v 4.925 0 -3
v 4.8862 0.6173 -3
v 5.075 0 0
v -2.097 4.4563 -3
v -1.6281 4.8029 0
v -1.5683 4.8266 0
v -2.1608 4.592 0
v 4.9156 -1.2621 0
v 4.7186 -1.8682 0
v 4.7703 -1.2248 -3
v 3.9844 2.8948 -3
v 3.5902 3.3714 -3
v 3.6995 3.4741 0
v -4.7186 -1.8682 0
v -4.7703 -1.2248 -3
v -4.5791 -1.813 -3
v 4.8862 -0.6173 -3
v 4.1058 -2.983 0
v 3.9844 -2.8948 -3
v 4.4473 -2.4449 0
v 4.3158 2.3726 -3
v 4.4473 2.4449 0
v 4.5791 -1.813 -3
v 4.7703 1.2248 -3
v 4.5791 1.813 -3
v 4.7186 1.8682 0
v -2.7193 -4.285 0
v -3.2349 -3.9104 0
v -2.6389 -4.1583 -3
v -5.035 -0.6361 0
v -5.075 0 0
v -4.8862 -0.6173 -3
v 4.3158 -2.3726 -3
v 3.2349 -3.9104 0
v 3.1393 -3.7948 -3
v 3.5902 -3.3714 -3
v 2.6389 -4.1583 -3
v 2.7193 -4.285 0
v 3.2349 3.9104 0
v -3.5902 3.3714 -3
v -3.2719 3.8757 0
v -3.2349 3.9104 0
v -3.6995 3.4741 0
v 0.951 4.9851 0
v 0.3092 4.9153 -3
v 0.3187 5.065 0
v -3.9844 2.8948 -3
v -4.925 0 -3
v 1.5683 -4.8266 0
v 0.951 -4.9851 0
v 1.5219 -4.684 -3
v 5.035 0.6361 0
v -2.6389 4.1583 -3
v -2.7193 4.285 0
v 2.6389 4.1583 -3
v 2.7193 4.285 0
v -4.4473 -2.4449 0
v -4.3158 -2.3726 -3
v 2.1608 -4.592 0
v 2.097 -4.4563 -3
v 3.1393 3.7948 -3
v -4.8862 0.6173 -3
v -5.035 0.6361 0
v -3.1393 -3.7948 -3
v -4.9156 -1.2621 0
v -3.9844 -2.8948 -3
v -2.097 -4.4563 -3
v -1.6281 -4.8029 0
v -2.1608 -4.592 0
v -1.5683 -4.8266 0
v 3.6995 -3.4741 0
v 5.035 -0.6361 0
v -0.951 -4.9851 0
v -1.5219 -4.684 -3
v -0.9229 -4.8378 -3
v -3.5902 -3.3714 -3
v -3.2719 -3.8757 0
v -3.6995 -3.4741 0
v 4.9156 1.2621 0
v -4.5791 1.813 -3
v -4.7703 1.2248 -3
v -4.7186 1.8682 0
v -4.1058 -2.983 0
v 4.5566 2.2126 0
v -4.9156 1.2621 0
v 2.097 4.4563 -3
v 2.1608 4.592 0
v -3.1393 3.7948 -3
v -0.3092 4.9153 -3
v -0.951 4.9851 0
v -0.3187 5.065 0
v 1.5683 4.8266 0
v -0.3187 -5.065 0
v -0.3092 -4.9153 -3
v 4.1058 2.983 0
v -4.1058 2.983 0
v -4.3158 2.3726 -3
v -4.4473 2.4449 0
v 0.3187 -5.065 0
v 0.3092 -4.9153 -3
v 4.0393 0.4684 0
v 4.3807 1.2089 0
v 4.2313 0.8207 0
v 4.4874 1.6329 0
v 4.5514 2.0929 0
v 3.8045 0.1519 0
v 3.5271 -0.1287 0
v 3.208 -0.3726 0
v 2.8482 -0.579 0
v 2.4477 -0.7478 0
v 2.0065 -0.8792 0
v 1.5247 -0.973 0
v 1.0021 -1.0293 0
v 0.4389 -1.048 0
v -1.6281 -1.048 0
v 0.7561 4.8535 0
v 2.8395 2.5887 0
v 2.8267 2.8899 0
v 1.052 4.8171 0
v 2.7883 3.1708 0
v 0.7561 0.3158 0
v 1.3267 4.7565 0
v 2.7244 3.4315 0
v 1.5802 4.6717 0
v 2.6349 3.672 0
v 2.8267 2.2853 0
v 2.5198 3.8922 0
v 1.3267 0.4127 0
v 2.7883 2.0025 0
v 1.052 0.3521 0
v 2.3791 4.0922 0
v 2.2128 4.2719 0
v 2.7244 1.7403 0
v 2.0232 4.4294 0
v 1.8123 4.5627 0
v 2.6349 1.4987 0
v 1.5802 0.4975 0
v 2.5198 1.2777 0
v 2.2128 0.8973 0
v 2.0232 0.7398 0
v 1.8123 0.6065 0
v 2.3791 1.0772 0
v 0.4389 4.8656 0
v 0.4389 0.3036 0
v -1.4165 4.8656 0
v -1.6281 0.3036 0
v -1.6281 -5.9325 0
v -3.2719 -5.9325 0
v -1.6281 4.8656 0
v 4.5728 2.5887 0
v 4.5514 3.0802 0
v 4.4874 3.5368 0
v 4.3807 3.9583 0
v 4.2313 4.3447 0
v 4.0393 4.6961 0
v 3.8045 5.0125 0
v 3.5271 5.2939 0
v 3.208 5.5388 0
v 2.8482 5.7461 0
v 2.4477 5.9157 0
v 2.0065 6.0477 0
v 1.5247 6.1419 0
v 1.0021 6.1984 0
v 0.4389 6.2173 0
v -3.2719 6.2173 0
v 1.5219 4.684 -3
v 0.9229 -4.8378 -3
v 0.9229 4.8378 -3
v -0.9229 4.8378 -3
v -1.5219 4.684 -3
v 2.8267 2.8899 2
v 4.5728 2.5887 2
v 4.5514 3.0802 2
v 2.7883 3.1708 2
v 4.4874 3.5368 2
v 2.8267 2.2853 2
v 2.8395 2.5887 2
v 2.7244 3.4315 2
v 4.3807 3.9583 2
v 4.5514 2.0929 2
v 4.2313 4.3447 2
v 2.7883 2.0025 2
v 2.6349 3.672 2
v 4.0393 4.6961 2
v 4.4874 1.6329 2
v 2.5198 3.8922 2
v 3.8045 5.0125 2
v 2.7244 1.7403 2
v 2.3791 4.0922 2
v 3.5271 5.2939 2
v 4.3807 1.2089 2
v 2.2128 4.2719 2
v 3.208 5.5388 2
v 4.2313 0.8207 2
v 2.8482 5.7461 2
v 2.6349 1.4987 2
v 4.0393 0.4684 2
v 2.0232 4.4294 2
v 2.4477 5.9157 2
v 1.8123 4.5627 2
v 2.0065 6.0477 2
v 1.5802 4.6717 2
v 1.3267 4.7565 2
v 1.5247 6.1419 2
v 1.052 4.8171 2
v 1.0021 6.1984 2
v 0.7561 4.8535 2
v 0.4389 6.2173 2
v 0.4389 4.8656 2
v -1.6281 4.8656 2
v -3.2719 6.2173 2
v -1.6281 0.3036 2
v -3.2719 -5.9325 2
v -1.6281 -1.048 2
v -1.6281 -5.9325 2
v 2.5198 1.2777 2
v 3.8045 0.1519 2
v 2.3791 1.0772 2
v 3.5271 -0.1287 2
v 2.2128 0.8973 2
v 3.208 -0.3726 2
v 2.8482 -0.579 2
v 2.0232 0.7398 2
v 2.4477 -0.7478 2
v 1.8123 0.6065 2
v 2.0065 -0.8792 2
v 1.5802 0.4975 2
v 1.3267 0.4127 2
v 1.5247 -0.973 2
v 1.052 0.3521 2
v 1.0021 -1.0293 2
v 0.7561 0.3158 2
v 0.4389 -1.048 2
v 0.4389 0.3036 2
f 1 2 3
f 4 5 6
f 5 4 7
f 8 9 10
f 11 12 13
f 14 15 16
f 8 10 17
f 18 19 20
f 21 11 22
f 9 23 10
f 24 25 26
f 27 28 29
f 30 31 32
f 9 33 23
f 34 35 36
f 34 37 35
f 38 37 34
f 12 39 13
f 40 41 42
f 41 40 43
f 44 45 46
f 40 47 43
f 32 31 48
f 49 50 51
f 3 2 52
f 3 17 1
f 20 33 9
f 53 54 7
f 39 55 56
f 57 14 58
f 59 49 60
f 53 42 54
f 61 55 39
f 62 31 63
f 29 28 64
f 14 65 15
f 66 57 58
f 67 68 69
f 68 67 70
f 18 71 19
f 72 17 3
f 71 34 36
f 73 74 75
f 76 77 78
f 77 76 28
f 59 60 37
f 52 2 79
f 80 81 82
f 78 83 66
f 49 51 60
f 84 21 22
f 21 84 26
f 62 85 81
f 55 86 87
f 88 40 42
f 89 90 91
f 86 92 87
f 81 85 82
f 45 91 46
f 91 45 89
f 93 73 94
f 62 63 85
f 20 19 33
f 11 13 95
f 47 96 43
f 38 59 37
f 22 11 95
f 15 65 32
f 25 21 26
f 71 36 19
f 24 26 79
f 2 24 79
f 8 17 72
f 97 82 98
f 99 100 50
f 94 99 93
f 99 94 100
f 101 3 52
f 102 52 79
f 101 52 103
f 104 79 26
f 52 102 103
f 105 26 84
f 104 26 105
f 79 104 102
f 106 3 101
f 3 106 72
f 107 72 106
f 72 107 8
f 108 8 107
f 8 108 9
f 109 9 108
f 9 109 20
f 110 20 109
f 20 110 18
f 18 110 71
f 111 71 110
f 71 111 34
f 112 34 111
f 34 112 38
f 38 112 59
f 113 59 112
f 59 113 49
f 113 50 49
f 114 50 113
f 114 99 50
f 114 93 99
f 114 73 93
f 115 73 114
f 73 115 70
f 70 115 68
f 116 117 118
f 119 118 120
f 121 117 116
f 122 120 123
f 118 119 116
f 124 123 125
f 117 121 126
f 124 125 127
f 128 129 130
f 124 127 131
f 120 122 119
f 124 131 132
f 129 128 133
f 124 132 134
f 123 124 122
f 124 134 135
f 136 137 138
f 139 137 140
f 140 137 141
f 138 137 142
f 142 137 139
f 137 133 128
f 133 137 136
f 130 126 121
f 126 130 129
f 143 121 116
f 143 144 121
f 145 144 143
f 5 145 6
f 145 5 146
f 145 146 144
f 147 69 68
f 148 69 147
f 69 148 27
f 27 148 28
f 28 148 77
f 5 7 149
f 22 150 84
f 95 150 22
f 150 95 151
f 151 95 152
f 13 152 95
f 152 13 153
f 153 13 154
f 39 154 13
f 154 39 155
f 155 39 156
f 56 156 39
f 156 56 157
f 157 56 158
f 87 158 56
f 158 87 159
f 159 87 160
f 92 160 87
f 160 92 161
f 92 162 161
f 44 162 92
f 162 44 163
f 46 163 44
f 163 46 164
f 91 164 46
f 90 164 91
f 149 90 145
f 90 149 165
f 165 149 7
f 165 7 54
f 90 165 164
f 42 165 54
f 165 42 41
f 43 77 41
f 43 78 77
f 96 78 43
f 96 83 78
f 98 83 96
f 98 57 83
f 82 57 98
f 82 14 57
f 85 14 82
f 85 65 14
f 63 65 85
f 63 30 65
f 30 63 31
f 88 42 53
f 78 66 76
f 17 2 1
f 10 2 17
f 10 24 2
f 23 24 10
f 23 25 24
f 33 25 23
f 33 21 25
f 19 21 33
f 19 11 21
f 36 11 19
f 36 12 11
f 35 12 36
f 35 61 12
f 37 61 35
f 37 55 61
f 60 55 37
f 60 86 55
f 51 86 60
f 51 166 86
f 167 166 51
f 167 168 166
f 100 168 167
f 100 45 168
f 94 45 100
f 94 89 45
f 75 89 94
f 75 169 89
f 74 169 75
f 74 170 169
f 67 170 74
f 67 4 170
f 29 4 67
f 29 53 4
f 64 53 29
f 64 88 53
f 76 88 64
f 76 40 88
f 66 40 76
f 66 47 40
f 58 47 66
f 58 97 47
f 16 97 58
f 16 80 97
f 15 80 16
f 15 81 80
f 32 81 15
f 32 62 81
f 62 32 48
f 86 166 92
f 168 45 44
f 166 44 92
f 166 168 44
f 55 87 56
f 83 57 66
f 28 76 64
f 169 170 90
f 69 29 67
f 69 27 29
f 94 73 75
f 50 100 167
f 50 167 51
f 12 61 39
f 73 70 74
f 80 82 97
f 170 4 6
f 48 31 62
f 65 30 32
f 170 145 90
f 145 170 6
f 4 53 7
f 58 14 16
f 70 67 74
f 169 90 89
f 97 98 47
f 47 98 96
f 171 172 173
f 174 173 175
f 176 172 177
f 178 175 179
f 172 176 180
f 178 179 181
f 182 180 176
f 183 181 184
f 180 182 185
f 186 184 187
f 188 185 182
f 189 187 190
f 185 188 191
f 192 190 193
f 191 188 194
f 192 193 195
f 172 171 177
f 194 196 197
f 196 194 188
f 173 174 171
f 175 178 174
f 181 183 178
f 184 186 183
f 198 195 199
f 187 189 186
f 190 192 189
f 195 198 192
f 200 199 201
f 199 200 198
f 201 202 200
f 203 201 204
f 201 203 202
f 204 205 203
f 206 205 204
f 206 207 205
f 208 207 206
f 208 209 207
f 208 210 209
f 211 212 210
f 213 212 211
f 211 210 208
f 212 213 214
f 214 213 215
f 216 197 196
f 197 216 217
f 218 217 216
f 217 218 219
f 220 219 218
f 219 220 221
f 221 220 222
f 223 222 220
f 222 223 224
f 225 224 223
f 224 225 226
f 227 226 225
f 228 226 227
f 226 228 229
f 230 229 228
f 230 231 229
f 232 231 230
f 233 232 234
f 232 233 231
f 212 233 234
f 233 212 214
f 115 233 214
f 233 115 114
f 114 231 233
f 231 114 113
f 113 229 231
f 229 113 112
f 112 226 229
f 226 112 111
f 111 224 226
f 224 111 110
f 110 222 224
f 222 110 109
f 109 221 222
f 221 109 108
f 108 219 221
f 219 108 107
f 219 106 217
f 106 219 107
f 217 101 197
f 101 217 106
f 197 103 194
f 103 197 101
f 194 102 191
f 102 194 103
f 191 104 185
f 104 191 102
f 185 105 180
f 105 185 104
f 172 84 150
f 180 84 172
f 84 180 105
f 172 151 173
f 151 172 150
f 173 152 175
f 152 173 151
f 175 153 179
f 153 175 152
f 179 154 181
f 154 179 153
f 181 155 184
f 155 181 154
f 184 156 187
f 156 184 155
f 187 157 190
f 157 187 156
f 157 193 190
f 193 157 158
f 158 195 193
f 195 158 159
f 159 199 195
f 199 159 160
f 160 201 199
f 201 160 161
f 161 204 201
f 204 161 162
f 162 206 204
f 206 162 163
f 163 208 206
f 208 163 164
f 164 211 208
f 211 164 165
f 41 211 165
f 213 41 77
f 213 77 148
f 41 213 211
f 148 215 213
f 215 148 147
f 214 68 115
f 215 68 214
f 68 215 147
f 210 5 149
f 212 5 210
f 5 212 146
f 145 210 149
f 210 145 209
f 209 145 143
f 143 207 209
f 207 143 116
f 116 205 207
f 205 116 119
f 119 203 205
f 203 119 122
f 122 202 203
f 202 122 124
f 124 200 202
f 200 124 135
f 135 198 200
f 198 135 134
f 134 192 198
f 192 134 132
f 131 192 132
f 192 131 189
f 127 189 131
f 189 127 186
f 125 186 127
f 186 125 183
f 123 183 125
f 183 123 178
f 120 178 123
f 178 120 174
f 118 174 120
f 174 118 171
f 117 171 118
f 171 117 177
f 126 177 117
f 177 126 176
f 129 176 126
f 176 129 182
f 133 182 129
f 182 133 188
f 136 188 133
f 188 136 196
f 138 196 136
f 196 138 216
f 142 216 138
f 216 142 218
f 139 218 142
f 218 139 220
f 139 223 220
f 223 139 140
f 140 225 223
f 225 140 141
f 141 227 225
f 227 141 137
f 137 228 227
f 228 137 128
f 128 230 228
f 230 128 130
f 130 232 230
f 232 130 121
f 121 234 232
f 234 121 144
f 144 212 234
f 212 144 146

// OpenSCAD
$fn = 50;

difference() {
	union() {
		translate(v = [0, 0, -3.0]) {
			cylinder(h = 3, r1 = 4.925, r2 = 5.075);
		}
		linear_extrude(height = 2) {
			text(font = "Impact", halign = "center", size = 12, text = "P", valign = "center");
		}
	}
	union();
}
